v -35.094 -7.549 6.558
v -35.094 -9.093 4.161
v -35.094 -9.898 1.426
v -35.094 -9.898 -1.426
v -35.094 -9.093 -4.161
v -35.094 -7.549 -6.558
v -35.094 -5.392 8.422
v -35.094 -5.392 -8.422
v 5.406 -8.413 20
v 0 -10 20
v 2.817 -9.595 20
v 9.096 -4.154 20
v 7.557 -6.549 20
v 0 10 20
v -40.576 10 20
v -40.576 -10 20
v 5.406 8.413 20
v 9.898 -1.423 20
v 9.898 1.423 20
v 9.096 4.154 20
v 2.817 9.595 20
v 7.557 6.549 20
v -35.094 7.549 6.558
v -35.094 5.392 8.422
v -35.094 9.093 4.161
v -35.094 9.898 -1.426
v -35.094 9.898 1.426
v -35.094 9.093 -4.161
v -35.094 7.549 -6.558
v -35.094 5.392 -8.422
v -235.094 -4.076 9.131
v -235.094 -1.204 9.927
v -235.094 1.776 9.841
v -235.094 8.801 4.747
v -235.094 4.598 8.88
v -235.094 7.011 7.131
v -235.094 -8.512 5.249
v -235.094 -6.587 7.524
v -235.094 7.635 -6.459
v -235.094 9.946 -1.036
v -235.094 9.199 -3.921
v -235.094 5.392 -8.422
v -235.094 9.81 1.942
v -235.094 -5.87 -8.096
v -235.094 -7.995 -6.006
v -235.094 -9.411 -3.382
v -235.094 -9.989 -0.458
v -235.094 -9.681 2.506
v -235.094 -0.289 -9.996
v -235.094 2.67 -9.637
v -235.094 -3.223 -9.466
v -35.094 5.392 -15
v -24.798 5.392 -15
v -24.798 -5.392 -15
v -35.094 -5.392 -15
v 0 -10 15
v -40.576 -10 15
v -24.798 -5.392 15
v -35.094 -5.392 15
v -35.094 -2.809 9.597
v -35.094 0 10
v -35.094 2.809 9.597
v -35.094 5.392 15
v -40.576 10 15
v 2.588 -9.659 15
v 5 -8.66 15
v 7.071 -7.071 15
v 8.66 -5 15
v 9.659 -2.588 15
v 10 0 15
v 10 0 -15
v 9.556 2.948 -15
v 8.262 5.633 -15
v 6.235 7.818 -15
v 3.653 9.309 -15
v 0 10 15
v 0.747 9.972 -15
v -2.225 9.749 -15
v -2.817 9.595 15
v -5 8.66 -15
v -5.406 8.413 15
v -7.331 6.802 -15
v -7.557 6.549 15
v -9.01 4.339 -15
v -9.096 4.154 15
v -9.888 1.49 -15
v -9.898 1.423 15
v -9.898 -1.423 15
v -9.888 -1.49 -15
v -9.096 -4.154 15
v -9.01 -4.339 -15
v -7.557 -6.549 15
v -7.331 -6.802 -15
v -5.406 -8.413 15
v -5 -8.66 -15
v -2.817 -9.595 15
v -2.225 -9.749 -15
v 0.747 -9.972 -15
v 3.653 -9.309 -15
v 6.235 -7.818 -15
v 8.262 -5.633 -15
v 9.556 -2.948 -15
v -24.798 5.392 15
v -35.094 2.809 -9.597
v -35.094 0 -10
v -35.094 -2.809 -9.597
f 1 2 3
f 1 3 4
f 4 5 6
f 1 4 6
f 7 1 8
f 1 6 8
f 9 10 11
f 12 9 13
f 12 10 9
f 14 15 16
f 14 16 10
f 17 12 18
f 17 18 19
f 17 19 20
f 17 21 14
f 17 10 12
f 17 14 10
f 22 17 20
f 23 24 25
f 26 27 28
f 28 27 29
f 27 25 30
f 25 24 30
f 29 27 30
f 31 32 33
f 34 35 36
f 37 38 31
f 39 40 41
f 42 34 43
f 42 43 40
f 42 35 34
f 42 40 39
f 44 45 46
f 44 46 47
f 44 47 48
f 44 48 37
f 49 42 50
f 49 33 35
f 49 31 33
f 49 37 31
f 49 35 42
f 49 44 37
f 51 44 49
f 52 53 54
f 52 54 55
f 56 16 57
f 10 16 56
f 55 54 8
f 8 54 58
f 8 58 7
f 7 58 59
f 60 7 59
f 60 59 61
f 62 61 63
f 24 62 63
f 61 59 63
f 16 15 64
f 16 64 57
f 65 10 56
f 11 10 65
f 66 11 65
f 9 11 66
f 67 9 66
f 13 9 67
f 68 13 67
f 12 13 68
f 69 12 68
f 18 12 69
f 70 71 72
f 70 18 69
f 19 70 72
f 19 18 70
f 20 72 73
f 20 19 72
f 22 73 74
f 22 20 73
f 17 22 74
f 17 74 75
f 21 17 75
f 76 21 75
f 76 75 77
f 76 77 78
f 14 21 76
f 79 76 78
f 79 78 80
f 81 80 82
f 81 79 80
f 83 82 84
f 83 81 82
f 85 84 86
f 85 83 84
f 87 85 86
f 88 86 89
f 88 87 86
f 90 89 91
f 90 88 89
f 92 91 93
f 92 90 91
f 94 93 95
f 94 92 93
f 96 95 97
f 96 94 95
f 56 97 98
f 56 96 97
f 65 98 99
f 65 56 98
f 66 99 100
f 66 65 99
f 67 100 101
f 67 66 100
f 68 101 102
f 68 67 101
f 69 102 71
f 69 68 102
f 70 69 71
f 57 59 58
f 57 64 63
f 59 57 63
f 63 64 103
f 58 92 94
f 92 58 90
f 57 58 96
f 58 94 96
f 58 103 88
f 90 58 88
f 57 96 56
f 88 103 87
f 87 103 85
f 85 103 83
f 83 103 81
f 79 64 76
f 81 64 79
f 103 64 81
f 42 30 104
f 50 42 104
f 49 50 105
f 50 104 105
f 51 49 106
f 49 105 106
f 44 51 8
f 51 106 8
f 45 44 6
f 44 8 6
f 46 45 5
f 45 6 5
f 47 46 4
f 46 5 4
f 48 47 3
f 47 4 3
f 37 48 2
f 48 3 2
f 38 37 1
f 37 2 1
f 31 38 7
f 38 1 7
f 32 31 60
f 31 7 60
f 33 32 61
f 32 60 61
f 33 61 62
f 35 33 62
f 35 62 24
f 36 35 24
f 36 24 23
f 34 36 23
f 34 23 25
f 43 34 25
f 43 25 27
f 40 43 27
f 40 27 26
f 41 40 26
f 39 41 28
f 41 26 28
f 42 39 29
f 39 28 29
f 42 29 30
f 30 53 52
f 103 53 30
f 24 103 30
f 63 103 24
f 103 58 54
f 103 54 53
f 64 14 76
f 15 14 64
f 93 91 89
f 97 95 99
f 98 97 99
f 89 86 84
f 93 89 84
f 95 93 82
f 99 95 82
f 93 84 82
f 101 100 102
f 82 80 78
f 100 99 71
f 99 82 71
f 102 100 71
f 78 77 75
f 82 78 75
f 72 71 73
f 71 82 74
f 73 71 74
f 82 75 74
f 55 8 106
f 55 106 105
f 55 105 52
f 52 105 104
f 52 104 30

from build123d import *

# Parameters (mm, degrees)
SZKIC1_R                    = 10
DODANIE_WYCI_GNI_CIE1_DEPTH = 15
DODANIE_WYCI_GNI_CIE2_START = 5
DODANIE_WYCI_GNI_CIE2_DEPTH = 5
SZKIC3_W                    = 10.29571442
SZKIC3_H                    = 10.783406156
DODANIE_WYCI_GNI_CIE3_DEPTH = 30
SZKIC4_R                    = 10
DODANIE_WYCI_GNI_CIE4_DEPTH = 200


with BuildPart() as part:
    # Szkic1 → Dodanie-wyciągnięcie1 (new, symmetric)
    with BuildSketch(Plane.XY):
        Circle(SZKIC1_R)
    extrude(amount=DODANIE_WYCI_GNI_CIE1_DEPTH, both=True)

    # Szkic2 → Dodanie-wyciągnięcie2 (add)
    with BuildSketch(Plane.XY.offset(15).offset(DODANIE_WYCI_GNI_CIE2_START)):
        with BuildLine():
            Line((0, 10), (-40.57595794, 10))
            Line((-40.57595794, 10), (-40.57595794, -10))
            Line((-40.57595794, -10), (0, -10))
            ThreePointArc((0, -10), (10, 0), (0, 10))
        make_face()
    extrude(amount=-DODANIE_WYCI_GNI_CIE2_DEPTH)

    # Szkic3 → Dodanie-wyciągnięcie3 (add)
    with BuildSketch(Plane(origin=(0, 0, 15), x_dir=(-1, 0, 0), z_dir=(0, 0, -1))):
        with Locations((29.945825027, 0)):
            Rectangle(SZKIC3_W, SZKIC3_H)
    extrude(amount=DODANIE_WYCI_GNI_CIE3_DEPTH)

    # Szkic4 → Dodanie-wyciągnięcie4 (add)
    with BuildSketch(Plane.ZY.offset(35.093682237)):
        with Locations(Location((0, 0, 0), (0, 0, 147.37282405))):
            Circle(SZKIC4_R)
    extrude(amount=DODANIE_WYCI_GNI_CIE4_DEPTH)


solid = part.part
